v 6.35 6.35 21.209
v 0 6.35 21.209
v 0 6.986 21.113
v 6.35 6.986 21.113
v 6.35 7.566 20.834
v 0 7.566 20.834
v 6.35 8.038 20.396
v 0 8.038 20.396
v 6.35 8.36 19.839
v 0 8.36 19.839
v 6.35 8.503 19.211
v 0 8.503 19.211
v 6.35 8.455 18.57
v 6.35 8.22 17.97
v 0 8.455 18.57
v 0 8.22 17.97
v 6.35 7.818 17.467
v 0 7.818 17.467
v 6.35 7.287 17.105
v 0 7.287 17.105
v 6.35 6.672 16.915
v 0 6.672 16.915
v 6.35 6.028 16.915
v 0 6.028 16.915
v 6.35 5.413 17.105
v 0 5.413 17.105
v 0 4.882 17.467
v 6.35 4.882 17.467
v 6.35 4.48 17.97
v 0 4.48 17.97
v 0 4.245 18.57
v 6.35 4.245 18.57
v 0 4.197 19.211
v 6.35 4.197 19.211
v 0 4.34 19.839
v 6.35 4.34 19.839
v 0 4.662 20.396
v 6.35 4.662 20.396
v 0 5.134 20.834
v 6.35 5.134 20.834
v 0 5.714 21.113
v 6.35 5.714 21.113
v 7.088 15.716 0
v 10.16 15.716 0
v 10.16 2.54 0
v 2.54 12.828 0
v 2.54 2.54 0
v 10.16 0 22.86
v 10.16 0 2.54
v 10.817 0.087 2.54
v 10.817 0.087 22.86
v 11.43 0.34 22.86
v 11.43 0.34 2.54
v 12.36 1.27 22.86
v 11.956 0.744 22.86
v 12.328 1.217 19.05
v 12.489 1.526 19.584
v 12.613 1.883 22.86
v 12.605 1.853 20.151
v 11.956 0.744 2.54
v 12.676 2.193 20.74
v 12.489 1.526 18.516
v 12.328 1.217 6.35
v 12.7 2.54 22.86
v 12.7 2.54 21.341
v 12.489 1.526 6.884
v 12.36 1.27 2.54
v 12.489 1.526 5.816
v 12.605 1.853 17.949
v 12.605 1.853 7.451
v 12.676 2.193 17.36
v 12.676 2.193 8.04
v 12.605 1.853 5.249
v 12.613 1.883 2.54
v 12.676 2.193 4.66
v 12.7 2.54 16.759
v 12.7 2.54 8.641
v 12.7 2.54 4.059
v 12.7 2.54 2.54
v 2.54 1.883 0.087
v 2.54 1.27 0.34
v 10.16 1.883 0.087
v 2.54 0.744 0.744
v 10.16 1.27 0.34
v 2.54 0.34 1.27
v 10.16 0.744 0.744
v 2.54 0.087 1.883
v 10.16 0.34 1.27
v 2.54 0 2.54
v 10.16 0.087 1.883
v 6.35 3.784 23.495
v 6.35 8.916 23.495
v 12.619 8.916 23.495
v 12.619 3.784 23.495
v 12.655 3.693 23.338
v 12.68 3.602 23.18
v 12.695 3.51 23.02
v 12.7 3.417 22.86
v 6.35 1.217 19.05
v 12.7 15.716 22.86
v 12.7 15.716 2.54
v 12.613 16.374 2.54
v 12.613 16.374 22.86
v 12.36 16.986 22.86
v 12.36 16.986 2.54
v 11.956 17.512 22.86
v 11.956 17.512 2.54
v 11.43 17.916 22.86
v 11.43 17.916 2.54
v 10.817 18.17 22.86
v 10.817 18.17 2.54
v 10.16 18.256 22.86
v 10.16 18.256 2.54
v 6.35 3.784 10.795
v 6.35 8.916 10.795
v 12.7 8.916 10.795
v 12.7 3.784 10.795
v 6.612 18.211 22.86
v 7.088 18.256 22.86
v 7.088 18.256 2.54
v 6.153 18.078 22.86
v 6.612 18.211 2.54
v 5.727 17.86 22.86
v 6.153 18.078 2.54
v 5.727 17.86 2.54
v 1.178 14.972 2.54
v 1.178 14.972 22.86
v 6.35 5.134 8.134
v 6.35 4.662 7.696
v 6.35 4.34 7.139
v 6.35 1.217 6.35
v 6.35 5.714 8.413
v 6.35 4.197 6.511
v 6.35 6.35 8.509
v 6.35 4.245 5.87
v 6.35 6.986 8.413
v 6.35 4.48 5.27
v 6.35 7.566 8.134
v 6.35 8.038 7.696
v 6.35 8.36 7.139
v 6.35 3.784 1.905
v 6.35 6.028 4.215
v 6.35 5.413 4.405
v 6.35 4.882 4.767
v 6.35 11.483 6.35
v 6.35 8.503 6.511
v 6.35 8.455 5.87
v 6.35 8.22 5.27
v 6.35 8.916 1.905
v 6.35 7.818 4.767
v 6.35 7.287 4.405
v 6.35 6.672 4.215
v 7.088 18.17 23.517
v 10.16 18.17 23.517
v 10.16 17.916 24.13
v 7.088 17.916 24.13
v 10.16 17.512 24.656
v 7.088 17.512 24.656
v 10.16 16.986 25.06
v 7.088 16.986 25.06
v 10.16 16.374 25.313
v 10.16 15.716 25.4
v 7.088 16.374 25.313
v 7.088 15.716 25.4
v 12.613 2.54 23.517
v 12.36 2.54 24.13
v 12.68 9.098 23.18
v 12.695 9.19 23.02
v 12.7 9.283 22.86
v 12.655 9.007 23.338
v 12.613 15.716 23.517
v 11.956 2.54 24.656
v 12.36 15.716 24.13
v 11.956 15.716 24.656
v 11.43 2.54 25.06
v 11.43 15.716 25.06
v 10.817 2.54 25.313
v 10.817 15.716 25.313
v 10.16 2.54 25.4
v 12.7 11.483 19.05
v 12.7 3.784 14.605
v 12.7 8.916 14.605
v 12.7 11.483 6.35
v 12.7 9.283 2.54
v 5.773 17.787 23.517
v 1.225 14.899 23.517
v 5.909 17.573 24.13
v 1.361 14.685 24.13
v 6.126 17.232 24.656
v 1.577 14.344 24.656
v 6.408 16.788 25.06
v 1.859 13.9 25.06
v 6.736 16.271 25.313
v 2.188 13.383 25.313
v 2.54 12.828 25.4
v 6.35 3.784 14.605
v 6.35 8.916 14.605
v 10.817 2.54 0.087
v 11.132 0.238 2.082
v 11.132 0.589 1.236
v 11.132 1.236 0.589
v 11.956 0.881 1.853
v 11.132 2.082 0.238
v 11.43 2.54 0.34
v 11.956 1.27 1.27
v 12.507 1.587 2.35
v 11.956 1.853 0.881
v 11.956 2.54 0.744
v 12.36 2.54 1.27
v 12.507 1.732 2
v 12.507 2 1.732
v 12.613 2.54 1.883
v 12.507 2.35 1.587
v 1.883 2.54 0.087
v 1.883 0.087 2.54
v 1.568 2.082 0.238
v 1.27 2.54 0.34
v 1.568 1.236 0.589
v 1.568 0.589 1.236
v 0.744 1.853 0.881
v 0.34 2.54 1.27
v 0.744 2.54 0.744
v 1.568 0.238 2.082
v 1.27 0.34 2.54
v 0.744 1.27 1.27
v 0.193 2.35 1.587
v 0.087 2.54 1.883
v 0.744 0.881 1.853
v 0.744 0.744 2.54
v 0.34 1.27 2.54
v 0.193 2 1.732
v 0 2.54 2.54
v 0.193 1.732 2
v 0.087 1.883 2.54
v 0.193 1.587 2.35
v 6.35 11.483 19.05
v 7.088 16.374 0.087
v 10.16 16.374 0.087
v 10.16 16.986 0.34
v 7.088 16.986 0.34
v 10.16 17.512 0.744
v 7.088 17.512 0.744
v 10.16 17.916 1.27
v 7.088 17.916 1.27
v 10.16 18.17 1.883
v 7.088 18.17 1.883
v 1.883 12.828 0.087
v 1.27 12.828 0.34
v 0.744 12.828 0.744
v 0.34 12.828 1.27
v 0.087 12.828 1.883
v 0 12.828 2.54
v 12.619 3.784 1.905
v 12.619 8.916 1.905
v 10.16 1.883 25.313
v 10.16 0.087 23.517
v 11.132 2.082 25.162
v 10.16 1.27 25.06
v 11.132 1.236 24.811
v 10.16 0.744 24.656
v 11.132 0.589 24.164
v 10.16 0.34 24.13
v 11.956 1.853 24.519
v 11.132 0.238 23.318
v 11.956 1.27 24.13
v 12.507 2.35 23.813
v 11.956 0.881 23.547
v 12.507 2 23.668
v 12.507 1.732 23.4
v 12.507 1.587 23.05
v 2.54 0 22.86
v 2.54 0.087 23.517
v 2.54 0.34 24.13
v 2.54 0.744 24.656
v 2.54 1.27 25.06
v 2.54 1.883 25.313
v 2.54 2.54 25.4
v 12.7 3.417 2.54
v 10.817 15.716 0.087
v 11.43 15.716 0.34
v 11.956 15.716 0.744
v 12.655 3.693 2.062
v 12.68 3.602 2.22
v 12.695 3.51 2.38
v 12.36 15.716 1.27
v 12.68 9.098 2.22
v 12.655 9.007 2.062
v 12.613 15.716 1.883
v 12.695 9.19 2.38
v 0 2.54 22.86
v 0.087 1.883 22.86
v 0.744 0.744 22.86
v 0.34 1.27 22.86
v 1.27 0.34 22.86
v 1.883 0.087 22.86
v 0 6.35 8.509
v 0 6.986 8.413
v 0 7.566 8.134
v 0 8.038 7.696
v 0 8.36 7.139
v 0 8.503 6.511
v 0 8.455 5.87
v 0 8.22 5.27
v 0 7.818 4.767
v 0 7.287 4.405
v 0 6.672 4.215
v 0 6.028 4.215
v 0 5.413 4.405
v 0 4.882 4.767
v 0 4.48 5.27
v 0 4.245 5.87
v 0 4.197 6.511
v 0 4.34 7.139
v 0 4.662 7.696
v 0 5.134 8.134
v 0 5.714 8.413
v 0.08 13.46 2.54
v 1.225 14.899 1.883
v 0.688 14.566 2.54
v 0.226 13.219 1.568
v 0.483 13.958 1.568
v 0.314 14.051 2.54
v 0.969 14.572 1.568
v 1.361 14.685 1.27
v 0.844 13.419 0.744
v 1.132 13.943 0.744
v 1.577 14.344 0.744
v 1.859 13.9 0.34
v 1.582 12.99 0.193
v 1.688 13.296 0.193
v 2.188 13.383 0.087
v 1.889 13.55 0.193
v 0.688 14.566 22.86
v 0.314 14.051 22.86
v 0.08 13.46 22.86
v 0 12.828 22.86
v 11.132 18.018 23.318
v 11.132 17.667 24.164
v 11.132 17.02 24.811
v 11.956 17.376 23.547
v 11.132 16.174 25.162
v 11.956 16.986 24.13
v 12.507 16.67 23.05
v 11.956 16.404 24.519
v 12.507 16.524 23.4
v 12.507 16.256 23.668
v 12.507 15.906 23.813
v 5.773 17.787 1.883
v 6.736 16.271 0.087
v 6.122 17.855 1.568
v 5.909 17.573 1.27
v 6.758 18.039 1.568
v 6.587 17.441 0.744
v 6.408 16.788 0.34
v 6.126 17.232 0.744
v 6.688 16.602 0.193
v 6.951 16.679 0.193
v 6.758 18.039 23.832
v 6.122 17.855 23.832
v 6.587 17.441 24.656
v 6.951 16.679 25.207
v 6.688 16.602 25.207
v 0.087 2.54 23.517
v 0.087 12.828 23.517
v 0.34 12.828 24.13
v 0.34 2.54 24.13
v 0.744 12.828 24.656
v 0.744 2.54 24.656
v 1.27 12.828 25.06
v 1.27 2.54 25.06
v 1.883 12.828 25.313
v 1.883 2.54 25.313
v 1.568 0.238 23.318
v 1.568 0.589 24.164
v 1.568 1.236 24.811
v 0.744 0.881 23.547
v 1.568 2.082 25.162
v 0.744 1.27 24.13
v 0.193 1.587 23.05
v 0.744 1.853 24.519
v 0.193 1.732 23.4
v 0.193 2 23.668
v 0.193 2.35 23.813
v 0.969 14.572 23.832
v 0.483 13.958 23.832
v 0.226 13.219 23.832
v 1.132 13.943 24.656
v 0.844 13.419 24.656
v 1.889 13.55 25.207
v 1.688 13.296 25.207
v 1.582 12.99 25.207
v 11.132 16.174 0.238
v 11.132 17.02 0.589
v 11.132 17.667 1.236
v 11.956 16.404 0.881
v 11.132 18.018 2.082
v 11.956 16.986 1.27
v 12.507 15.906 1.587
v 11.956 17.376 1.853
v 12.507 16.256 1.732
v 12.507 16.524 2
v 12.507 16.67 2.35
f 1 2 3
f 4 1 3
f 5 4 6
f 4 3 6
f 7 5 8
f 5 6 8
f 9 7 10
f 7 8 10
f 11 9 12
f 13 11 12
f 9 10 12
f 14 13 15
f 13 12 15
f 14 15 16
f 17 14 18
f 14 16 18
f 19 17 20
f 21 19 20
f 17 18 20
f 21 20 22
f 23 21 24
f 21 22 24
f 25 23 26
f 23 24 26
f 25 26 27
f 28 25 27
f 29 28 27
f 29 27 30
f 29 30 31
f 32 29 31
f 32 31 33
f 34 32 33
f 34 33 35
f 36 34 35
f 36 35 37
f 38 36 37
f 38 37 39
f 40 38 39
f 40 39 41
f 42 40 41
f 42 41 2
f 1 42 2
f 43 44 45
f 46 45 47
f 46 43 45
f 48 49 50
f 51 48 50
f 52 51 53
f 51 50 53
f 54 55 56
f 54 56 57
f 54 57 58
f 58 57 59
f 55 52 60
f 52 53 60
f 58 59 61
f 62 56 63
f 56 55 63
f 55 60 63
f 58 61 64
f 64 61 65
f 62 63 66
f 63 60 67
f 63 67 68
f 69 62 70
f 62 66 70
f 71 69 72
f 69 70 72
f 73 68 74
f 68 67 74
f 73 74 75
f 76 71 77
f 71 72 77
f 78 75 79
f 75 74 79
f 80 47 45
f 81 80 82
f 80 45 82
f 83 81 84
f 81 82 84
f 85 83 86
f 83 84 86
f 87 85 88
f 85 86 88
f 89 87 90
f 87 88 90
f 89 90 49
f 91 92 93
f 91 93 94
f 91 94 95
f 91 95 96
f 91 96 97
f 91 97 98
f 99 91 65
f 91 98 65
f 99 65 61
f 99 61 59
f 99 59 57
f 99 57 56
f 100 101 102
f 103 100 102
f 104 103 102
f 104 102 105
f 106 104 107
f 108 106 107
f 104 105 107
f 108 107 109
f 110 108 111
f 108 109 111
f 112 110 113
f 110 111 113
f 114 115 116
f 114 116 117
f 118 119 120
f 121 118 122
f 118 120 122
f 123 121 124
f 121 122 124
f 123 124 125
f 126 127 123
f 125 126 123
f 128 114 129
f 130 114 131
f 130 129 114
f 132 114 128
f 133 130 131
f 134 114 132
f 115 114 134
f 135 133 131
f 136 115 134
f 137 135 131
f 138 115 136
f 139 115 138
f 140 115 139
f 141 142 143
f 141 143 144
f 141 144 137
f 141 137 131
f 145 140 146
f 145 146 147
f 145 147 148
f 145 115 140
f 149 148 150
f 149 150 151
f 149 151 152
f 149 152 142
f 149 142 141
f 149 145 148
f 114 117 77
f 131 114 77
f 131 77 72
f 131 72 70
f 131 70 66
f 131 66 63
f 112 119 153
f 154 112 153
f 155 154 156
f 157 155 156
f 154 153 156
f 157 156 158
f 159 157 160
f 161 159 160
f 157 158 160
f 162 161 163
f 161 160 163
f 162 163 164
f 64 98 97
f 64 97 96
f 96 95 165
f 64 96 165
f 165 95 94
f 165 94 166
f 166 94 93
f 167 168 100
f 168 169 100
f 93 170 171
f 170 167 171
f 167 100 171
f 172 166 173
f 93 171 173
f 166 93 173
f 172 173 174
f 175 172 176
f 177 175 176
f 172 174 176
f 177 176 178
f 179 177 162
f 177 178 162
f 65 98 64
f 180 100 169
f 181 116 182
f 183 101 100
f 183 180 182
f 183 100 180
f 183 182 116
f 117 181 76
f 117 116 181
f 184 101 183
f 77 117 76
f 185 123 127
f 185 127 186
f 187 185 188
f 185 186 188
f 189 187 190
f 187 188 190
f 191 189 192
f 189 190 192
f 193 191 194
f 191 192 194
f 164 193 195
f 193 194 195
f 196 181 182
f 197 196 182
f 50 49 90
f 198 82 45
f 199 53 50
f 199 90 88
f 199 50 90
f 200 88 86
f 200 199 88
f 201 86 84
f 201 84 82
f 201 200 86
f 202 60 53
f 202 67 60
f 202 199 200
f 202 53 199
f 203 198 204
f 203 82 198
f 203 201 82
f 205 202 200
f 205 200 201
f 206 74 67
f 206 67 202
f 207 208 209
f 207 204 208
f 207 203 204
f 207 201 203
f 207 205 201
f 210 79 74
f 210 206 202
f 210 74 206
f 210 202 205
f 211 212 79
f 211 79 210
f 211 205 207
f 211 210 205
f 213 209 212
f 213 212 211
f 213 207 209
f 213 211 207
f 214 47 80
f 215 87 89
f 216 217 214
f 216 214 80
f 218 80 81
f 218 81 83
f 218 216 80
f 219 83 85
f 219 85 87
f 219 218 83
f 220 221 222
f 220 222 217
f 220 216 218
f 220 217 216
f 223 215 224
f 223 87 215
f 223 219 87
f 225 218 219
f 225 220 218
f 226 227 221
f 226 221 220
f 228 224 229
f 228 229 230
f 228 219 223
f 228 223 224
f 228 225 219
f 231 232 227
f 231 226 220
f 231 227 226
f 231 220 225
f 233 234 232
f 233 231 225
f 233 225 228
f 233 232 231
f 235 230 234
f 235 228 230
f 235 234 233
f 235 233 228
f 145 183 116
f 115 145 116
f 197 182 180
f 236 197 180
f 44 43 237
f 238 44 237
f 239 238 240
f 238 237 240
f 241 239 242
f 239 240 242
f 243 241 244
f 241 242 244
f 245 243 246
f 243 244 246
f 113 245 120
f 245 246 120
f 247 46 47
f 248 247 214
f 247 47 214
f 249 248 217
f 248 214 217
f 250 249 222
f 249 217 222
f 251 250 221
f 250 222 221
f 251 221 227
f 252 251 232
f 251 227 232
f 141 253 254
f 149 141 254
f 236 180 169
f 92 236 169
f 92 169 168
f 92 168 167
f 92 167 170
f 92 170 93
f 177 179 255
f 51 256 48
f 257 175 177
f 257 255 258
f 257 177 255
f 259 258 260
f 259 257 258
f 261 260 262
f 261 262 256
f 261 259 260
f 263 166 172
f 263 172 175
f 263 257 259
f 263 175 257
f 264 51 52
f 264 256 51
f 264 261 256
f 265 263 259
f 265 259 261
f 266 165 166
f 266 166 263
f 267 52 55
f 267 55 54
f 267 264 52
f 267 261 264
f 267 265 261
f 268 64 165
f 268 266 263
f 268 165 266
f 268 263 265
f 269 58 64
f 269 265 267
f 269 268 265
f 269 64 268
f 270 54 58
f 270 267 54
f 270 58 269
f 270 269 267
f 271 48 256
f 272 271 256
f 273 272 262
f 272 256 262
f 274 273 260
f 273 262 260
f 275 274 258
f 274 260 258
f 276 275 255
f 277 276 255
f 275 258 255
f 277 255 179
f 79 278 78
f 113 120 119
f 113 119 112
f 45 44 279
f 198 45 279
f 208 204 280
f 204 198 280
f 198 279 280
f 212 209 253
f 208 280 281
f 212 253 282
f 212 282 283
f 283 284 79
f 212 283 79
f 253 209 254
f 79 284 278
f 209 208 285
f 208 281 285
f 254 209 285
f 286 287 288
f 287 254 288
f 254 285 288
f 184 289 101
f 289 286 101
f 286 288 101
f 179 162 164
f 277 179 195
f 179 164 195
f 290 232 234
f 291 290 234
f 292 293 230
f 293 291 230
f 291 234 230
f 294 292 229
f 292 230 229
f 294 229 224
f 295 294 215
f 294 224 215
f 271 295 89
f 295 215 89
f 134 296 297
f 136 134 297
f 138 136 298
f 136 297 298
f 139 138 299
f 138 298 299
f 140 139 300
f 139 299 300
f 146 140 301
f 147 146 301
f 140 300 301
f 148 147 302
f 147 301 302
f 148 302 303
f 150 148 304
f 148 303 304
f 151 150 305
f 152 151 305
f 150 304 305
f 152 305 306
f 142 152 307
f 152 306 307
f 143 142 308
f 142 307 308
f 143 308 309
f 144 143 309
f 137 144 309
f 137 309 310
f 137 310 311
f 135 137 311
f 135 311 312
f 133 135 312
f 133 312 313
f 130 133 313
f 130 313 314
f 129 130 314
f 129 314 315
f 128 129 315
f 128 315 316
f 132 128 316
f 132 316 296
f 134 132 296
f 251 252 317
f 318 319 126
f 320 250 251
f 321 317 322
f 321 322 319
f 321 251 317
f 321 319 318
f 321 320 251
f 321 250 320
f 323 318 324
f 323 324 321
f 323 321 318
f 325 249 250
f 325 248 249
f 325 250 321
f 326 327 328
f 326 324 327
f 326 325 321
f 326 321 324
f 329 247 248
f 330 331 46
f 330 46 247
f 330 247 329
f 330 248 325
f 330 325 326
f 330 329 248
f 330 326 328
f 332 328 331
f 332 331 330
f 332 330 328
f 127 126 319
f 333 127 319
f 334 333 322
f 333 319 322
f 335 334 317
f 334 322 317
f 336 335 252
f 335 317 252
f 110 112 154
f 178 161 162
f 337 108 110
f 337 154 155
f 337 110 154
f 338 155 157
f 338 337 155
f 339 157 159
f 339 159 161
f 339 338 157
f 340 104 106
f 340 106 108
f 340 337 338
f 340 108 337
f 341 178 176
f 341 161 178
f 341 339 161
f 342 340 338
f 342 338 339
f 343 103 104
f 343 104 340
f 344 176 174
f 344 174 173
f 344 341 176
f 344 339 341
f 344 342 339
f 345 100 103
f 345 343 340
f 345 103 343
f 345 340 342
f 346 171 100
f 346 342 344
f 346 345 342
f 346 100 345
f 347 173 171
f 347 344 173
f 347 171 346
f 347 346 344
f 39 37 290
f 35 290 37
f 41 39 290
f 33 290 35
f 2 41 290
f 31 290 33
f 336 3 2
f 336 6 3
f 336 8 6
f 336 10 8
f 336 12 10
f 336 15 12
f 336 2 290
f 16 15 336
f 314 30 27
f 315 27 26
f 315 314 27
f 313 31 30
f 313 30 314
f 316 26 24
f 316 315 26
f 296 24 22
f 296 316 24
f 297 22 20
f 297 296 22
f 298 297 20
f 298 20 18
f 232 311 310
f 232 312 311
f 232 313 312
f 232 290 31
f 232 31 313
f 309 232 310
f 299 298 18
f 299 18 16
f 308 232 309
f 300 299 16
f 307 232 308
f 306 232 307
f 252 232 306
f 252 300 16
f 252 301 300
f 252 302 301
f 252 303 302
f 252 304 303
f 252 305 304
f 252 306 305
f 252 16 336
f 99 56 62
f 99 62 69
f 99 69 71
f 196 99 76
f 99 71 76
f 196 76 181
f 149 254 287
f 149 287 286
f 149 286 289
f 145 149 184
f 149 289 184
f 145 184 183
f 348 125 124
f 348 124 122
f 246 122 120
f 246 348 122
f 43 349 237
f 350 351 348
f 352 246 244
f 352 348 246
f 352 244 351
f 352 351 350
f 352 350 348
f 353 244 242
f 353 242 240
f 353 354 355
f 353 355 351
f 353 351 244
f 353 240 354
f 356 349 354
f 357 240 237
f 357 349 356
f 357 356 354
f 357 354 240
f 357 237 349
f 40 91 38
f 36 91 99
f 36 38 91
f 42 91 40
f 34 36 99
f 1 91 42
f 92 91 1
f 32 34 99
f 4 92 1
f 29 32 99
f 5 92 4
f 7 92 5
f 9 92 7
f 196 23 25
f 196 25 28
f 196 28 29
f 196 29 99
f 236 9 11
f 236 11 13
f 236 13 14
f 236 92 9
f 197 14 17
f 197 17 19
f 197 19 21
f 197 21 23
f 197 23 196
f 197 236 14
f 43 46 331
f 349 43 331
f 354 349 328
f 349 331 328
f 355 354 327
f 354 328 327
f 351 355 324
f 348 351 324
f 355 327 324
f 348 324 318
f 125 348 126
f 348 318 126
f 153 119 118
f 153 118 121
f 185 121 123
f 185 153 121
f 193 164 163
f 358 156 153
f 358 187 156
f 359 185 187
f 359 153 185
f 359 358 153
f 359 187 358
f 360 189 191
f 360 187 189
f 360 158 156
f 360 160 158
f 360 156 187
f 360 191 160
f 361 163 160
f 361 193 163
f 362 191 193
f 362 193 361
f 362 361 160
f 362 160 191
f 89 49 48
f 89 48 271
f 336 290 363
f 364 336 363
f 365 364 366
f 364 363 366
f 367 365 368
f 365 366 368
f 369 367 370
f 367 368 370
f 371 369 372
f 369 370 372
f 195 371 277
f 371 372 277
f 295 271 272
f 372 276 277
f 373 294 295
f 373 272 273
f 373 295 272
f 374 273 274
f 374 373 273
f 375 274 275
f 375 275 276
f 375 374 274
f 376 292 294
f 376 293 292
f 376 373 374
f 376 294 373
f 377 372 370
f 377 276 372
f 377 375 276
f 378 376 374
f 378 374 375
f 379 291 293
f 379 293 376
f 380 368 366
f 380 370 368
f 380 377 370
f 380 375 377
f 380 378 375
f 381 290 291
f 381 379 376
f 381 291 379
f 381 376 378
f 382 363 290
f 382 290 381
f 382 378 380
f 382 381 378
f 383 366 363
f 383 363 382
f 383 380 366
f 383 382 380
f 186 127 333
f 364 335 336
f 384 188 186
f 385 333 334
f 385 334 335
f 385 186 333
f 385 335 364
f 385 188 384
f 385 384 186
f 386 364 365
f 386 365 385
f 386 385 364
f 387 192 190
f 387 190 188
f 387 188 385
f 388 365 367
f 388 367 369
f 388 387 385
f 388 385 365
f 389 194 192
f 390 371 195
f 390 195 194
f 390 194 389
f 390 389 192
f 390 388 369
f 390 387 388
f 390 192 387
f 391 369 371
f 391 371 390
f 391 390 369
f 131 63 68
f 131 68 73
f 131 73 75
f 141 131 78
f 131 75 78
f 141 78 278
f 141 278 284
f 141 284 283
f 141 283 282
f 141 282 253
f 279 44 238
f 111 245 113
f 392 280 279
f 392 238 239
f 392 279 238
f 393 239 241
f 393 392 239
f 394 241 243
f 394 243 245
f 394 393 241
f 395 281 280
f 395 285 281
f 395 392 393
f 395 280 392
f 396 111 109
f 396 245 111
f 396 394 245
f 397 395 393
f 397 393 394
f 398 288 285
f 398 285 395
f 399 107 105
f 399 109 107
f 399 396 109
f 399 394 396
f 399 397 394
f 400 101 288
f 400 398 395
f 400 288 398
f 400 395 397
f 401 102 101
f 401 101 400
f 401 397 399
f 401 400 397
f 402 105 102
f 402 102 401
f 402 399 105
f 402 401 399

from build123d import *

# Parameters (mm, degrees)
BOSS_EXTRUDE1_DEPTH = 25.4
SKETCH4_R           = 2.159
CUT_EXTRUDE1_DEPTH  = 34.76004538
CUT_EXTRUDE2_DEPTH  = 6.35
FILLET1_R           = 2.54


with BuildPart() as part:
    # Sketch3 → Boss-Extrude1 (new body)
    with BuildSketch(Plane.XY):
        Polygon((0, 14.224), (6.35, 18.25625), (12.7, 18.25625), (12.7, 0), (0, 0), align=None)
    extrude(amount=BOSS_EXTRUDE1_DEPTH)

    # Sketch4 → Cut-Extrude1 (cut, through all)
    with BuildSketch(Plane.ZY):
        with Locations((6.35, 6.35)):
            Circle(SKETCH4_R)
        with Locations((19.05, 6.35)):
            Circle(SKETCH4_R)
    extrude(amount=-CUT_EXTRUDE1_DEPTH, mode=Mode.SUBTRACT)

    # Sketch6 → Cut-Extrude2 (cut)
    with BuildSketch(Plane(origin=(12.7, 0, 0), x_dir=(0, 0, -1), z_dir=(1, 0, 0))):
        Polygon((-14.605, 8.916321947), (-19.05, 11.482643893), (-23.495, 8.916321947), (-23.495, 3.783678053), (-19.05, 1.217356107), (-14.605, 3.783678053), align=None)
        Polygon((-1.905, 3.783678053), (-1.905, 8.916321947), (-6.35, 11.482643893), (-10.795, 8.916321947), (-10.795, 3.783678053), (-6.35, 1.217356107), align=None)
    extrude(amount=-CUT_EXTRUDE2_DEPTH, mode=Mode.SUBTRACT)

    # Fillet1
    # the kernel refuses this fillet: 2.54 mm, written as the material it takes off along each edge
    with BuildSketch(Plane(origin=(2.54, 2.54, 2.54), x_dir=(0, 0, -1), z_dir=(-1, 0, 0))) as fillet1_piece_1_section:
        Polygon((0, 0), (FILLET1_R, 0), (FILLET1_R, FILLET1_R), (0, FILLET1_R), align=None)
    fillet1_piece_1 = extrude(amount=FILLET1_R, mode=Mode.PRIVATE)
    fillet1_piece_1 = fillet1_piece_1 - Plane(origin=(2.54, 2.54, 2.54), x_dir=(0, 0.7071067811865475, 0.7071067811865475), z_dir=(-1, 0, 0)) * Sphere(FILLET1_R, mode=Mode.PRIVATE)
    add(fillet1_piece_1, mode=Mode.SUBTRACT)
    with BuildSketch(Plane(origin=(2.54, 2.54, 22.86), x_dir=(0, 0, 1), z_dir=(-1, 0, 0))) as fillet1_piece_2_section:
        Polygon((0, 0), (FILLET1_R, 0), (FILLET1_R, -FILLET1_R), (0, -FILLET1_R), align=None)
    fillet1_piece_2 = extrude(amount=FILLET1_R, mode=Mode.PRIVATE)
    fillet1_piece_2 = fillet1_piece_2 - Plane(origin=(2.54, 2.54, 22.86), x_dir=(0, 0.7071067811865475, -0.7071067811865475), z_dir=(-1, 0, 0)) * Sphere(FILLET1_R, mode=Mode.PRIVATE)
    add(fillet1_piece_2, mode=Mode.SUBTRACT)
    with BuildSketch(Plane(origin=(10.16, 2.54, 2.54), x_dir=(0, 0, -1), z_dir=(1, 0, 0))) as fillet1_piece_3_section:
        Polygon((0, 0), (FILLET1_R, 0), (FILLET1_R, -FILLET1_R), (0, -FILLET1_R), align=None)
    fillet1_piece_3 = extrude(amount=FILLET1_R, mode=Mode.PRIVATE)
    fillet1_piece_3 = fillet1_piece_3 - Plane(origin=(10.16, 2.54, 2.54), x_dir=(0, 0.7071067811865475, 0.7071067811865475), z_dir=(1, 0, 0)) * Sphere(FILLET1_R, mode=Mode.PRIVATE)
    add(fillet1_piece_3, mode=Mode.SUBTRACT)
    with BuildSketch(Plane(origin=(10.16, 2.54, 22.86), x_dir=(0, 0, 1), z_dir=(1, 0, 0))) as fillet1_piece_4_section:
        Polygon((0, 0), (FILLET1_R, 0), (FILLET1_R, FILLET1_R), (0, FILLET1_R), align=None)
    fillet1_piece_4 = extrude(amount=FILLET1_R, mode=Mode.PRIVATE)
    fillet1_piece_4 = fillet1_piece_4 - Plane(origin=(10.16, 2.54, 22.86), x_dir=(0, 0.7071067811865475, -0.7071067811865475), z_dir=(1, 0, 0)) * Sphere(FILLET1_R, mode=Mode.PRIVATE)
    add(fillet1_piece_4, mode=Mode.SUBTRACT)
    with BuildSketch(Plane(origin=(10.16, 15.71625, 2.54), x_dir=(0, 1, 0), z_dir=(1, 0, 0))) as fillet1_piece_5_section:
        Polygon((0, 0), (FILLET1_R, 0), (FILLET1_R, -FILLET1_R), (0, -FILLET1_R), align=None)
    fillet1_piece_5 = extrude(amount=FILLET1_R, mode=Mode.PRIVATE)
    fillet1_piece_5 = fillet1_piece_5 - Plane(origin=(10.16, 15.71625, 2.54), x_dir=(0, -0.7071067811865475, 0.7071067811865475), z_dir=(1, 0, 0)) * Sphere(FILLET1_R, mode=Mode.PRIVATE)
    add(fillet1_piece_5, mode=Mode.SUBTRACT)
    with BuildSketch(Plane(origin=(10.16, 15.71625, 22.86), x_dir=(0, 1, 0), z_dir=(1, 0, 0))) as fillet1_piece_6_section:
        Polygon((0, 0), (FILLET1_R, 0), (FILLET1_R, FILLET1_R), (0, FILLET1_R), align=None)
    fillet1_piece_6 = extrude(amount=FILLET1_R, mode=Mode.PRIVATE)
    fillet1_piece_6 = fillet1_piece_6 - Plane(origin=(10.16, 15.71625, 22.86), x_dir=(0, -0.7071067811865475, -0.7071067811865475), z_dir=(1, 0, 0)) * Sphere(FILLET1_R, mode=Mode.PRIVATE)
    add(fillet1_piece_6, mode=Mode.SUBTRACT)
    with BuildSketch(Plane(origin=(7.088311936, 15.71625, 2.54), x_dir=(-0.5360558854014316, 0.8441824966951682, 0), z_dir=(0, 0, -1))) as fillet1_piece_7_section:
        Polygon((0, 0), (FILLET1_R, 0), (FILLET1_R, FILLET1_R * 0.290673990433), (FILLET1_R * 0.844182496695, FILLET1_R * 0.536055885401), align=None)
    fillet1_piece_7 = extrude(amount=FILLET1_R, mode=Mode.PRIVATE)
    fillet1_piece_7 = fillet1_piece_7 - Plane(origin=(7.088311936, 15.71625, 2.54), x_dir=(0.2791213923231542, -0.9602558244278364, 0), z_dir=(0, 0, -1)) * Sphere(FILLET1_R, mode=Mode.PRIVATE)
    add(fillet1_piece_7, mode=Mode.SUBTRACT)
    with BuildSketch(Plane(origin=(7.088311936, 15.71625, 22.86), x_dir=(-0.5360558854014316, 0.8441824966951682, 0), z_dir=(0, 0, 1))) as fillet1_piece_8_section:
        Polygon((0, 0), (FILLET1_R, 0), (FILLET1_R, -FILLET1_R * 0.290673990433), (FILLET1_R * 0.844182496695, -FILLET1_R * 0.536055885401), align=None)
    fillet1_piece_8 = extrude(amount=FILLET1_R, mode=Mode.PRIVATE)
    fillet1_piece_8 = fillet1_piece_8 - Plane(origin=(7.088311936, 15.71625, 22.86), x_dir=(0.2791213923231542, -0.9602558244278364, 0), z_dir=(0, 0, 1)) * Sphere(FILLET1_R, mode=Mode.PRIVATE)
    add(fillet1_piece_8, mode=Mode.SUBTRACT)
    with BuildSketch(Plane(origin=(2.54, 12.828071921, 22.86), x_dir=(-0.5360558854014316, 0.8441824966951682, 0), z_dir=(0, 0, 1))) as fillet1_piece_9_section:
        Polygon((0, 0), (FILLET1_R, 0), (FILLET1_R, FILLET1_R * 0.549577983925), (FILLET1_R * 0.536055885401, FILLET1_R * 0.844182496695), align=None)
    fillet1_piece_9 = extrude(amount=FILLET1_R, mode=Mode.PRIVATE)
    fillet1_piece_9 = fillet1_piece_9 - Plane(origin=(2.54, 12.828071921, 22.86), x_dir=(0.8763720344127349, -0.4816347758408693, 0), z_dir=(0, 0, 1)) * Sphere(FILLET1_R, mode=Mode.PRIVATE)
    add(fillet1_piece_9, mode=Mode.SUBTRACT)
    with BuildSketch(Plane(origin=(2.54, 12.828071921, 2.54), x_dir=(-0.5360558854014316, 0.8441824966951682, 0), z_dir=(0, 0, -1))) as fillet1_piece_10_section:
        Polygon((0, 0), (FILLET1_R, 0), (FILLET1_R, -FILLET1_R * 0.549577983925), (FILLET1_R * 0.536055885401, -FILLET1_R * 0.844182496695), align=None)
    fillet1_piece_10 = extrude(amount=FILLET1_R, mode=Mode.PRIVATE)
    fillet1_piece_10 = fillet1_piece_10 - Plane(origin=(2.54, 12.828071921, 2.54), x_dir=(0.8763720344127349, -0.4816347758408693, 0), z_dir=(0, 0, -1)) * Sphere(FILLET1_R, mode=Mode.PRIVATE)
    add(fillet1_piece_10, mode=Mode.SUBTRACT)
    with BuildSketch(Plane(origin=(0, 0, 2.54), x_dir=(0, 1, 0), z_dir=(0, 0, 1)), Plane(origin=(12.7, 0, 2.54), x_dir=(-1, 0, 0), z_dir=(0, 0, 1))) as fillet1_piece_11:
        with BuildLine():
            CenterArc((FILLET1_R, -FILLET1_R), FILLET1_R, 90, 90)
            Line((0, -FILLET1_R), (0, 0))
            Line((0, 0), (FILLET1_R, 0))
        make_face()
    extrude(amount=20.32, mode=Mode.SUBTRACT)
    with BuildSketch(Plane(origin=(12.7, 18.25625, 2.54), x_dir=(-1, 0, 0), z_dir=(0, 0, 1))) as fillet1_piece_12:
        with BuildLine():
            CenterArc((FILLET1_R, FILLET1_R), FILLET1_R, 180, 90)
            Line((0, FILLET1_R), (0, 0))
            Line((0, 0), (FILLET1_R, 0))
        make_face()
    extrude(amount=20.32, mode=Mode.SUBTRACT)
    with BuildSketch(Plane(origin=(6.35, 18.25625, 2.54), x_dir=(-0.8441824966951671, -0.536055885401433, 0), z_dir=(0, 0, 1))) as fillet1_piece_13:
        with BuildLine():
            CenterArc((FILLET1_R * 0.290673990433, FILLET1_R), FILLET1_R, 237.58445267, 32.41554733)
            Line((-FILLET1_R * 0.245381894968, FILLET1_R * 0.155817503305), (0, 0))
            Line((0, 0), (FILLET1_R * 0.290673990433, 0))
        make_face()
    extrude(amount=20.32, mode=Mode.SUBTRACT)
    with BuildSketch(Plane(origin=(1.178418051, 14.972295462, 25.4), x_dir=(0, 0, -1), z_dir=(0.844182496695168, 0.5360558854014315, 0))) as fillet1_piece_14:
        with BuildLine():
            CenterArc((FILLET1_R, -FILLET1_R), FILLET1_R, 90, 90)
            Line((0, -FILLET1_R), (0, 0))
            Line((0, 0), (FILLET1_R, 0))
        make_face()
    extrude(amount=5.387830183, mode=Mode.SUBTRACT)
    with BuildSketch(Plane(origin=(7.088311936, 18.25625, 25.4), x_dir=(0, 0, -1), z_dir=(1, 0, 0))) as fillet1_piece_15:
        with BuildLine():
            CenterArc((FILLET1_R, -FILLET1_R), FILLET1_R, 90, 90)
            Line((0, -FILLET1_R), (0, 0))
            Line((0, 0), (FILLET1_R, 0))
        make_face()
    extrude(amount=3.071688064, mode=Mode.SUBTRACT)
    with BuildSketch(Plane(origin=(12.7, 15.71625, 25.4), x_dir=(-1, 0, 0), z_dir=(0, -1, 0))) as fillet1_piece_16:
        with BuildLine():
            CenterArc((FILLET1_R, FILLET1_R), FILLET1_R, 180, 90)
            Line((0, FILLET1_R), (0, 0))
            Line((0, 0), (FILLET1_R, 0))
        make_face()
    extrude(amount=13.17625, mode=Mode.SUBTRACT)
    with BuildSketch(Plane(origin=(10.16, 0, 25.4), x_dir=(0, 1, 0), z_dir=(-1, 0, 0))) as fillet1_piece_17:
        with BuildLine():
            CenterArc((FILLET1_R, FILLET1_R), FILLET1_R, 180, 90)
            Line((0, FILLET1_R), (0, 0))
            Line((0, 0), (FILLET1_R, 0))
        make_face()
    extrude(amount=7.62, mode=Mode.SUBTRACT)
    with BuildSketch(Plane(origin=(0, 2.54, 25.4), x_dir=(0, 0, -1), z_dir=(0, 1, 0))) as fillet1_piece_18:
        with BuildLine():
            CenterArc((FILLET1_R, -FILLET1_R), FILLET1_R, 90, 90)
            Line((0, -FILLET1_R), (0, 0))
            Line((0, 0), (FILLET1_R, 0))
        make_face()
    extrude(amount=10.288071921, mode=Mode.SUBTRACT)
    with BuildSketch(Plane(origin=(10.16, 0, 0), x_dir=(0, 1, 0), z_dir=(-1, 0, 0))) as fillet1_piece_19:
        with BuildLine():
            CenterArc((FILLET1_R, -FILLET1_R), FILLET1_R, 90, 90)
            Line((0, -FILLET1_R), (0, 0))
            Line((0, 0), (FILLET1_R, 0))
        make_face()
    extrude(amount=7.62, mode=Mode.SUBTRACT)
    with BuildSketch(Plane(origin=(12.7, 15.71625, 0), x_dir=(-1, 0, 0), z_dir=(0, -1, 0))) as fillet1_piece_20:
        with BuildLine():
            CenterArc((FILLET1_R, -FILLET1_R), FILLET1_R, 90, 90)
            Line((0, -FILLET1_R), (0, 0))
            Line((0, 0), (FILLET1_R, 0))
        make_face()
    extrude(amount=13.17625, mode=Mode.SUBTRACT)
    with BuildSketch(Plane(origin=(7.088311936, 18.25625, 0), x_dir=(0, 0, 1), z_dir=(1, 0, 0))) as fillet1_piece_21:
        with BuildLine():
            CenterArc((FILLET1_R, FILLET1_R), FILLET1_R, 180, 90)
            Line((0, FILLET1_R), (0, 0))
            Line((0, 0), (FILLET1_R, 0))
        make_face()
    extrude(amount=3.071688064, mode=Mode.SUBTRACT)
    with BuildSketch(Plane(origin=(1.178418051, 14.972295462, 0), x_dir=(0, 0, 1), z_dir=(0.844182496695168, 0.5360558854014315, 0))) as fillet1_piece_22:
        with BuildLine():
            CenterArc((FILLET1_R, FILLET1_R), FILLET1_R, 180, 90)
            Line((0, FILLET1_R), (0, 0))
            Line((0, 0), (FILLET1_R, 0))
        make_face()
    extrude(amount=5.387830183, mode=Mode.SUBTRACT)
    with BuildSketch(Plane(origin=(0, 2.54, 0), x_dir=(0, 0, 1), z_dir=(0, 1, 0))) as fillet1_piece_23:
        with BuildLine():
            CenterArc((FILLET1_R, FILLET1_R), FILLET1_R, 180, 90)
            Line((0, FILLET1_R), (0, 0))
            Line((0, 0), (FILLET1_R, 0))
        make_face()
    extrude(amount=10.288071921, mode=Mode.SUBTRACT)
    with BuildSketch(Plane(origin=(0, 14.224, 2.54), x_dir=(0.844182496695168, 0.5360558854014316, 0), z_dir=(0, 0, 1))) as fillet1_piece_24:
        with BuildLine():
            CenterArc((FILLET1_R * 0.549577983925, -FILLET1_R), FILLET1_R, 90, 57.58445267)
            Line((-FILLET1_R * 0.29460451277, -FILLET1_R * 0.463944114599), (0, 0))
            Line((0, 0), (FILLET1_R * 0.549577983925, 0))
        make_face()
    extrude(amount=20.32, mode=Mode.SUBTRACT)


solid = part.part
